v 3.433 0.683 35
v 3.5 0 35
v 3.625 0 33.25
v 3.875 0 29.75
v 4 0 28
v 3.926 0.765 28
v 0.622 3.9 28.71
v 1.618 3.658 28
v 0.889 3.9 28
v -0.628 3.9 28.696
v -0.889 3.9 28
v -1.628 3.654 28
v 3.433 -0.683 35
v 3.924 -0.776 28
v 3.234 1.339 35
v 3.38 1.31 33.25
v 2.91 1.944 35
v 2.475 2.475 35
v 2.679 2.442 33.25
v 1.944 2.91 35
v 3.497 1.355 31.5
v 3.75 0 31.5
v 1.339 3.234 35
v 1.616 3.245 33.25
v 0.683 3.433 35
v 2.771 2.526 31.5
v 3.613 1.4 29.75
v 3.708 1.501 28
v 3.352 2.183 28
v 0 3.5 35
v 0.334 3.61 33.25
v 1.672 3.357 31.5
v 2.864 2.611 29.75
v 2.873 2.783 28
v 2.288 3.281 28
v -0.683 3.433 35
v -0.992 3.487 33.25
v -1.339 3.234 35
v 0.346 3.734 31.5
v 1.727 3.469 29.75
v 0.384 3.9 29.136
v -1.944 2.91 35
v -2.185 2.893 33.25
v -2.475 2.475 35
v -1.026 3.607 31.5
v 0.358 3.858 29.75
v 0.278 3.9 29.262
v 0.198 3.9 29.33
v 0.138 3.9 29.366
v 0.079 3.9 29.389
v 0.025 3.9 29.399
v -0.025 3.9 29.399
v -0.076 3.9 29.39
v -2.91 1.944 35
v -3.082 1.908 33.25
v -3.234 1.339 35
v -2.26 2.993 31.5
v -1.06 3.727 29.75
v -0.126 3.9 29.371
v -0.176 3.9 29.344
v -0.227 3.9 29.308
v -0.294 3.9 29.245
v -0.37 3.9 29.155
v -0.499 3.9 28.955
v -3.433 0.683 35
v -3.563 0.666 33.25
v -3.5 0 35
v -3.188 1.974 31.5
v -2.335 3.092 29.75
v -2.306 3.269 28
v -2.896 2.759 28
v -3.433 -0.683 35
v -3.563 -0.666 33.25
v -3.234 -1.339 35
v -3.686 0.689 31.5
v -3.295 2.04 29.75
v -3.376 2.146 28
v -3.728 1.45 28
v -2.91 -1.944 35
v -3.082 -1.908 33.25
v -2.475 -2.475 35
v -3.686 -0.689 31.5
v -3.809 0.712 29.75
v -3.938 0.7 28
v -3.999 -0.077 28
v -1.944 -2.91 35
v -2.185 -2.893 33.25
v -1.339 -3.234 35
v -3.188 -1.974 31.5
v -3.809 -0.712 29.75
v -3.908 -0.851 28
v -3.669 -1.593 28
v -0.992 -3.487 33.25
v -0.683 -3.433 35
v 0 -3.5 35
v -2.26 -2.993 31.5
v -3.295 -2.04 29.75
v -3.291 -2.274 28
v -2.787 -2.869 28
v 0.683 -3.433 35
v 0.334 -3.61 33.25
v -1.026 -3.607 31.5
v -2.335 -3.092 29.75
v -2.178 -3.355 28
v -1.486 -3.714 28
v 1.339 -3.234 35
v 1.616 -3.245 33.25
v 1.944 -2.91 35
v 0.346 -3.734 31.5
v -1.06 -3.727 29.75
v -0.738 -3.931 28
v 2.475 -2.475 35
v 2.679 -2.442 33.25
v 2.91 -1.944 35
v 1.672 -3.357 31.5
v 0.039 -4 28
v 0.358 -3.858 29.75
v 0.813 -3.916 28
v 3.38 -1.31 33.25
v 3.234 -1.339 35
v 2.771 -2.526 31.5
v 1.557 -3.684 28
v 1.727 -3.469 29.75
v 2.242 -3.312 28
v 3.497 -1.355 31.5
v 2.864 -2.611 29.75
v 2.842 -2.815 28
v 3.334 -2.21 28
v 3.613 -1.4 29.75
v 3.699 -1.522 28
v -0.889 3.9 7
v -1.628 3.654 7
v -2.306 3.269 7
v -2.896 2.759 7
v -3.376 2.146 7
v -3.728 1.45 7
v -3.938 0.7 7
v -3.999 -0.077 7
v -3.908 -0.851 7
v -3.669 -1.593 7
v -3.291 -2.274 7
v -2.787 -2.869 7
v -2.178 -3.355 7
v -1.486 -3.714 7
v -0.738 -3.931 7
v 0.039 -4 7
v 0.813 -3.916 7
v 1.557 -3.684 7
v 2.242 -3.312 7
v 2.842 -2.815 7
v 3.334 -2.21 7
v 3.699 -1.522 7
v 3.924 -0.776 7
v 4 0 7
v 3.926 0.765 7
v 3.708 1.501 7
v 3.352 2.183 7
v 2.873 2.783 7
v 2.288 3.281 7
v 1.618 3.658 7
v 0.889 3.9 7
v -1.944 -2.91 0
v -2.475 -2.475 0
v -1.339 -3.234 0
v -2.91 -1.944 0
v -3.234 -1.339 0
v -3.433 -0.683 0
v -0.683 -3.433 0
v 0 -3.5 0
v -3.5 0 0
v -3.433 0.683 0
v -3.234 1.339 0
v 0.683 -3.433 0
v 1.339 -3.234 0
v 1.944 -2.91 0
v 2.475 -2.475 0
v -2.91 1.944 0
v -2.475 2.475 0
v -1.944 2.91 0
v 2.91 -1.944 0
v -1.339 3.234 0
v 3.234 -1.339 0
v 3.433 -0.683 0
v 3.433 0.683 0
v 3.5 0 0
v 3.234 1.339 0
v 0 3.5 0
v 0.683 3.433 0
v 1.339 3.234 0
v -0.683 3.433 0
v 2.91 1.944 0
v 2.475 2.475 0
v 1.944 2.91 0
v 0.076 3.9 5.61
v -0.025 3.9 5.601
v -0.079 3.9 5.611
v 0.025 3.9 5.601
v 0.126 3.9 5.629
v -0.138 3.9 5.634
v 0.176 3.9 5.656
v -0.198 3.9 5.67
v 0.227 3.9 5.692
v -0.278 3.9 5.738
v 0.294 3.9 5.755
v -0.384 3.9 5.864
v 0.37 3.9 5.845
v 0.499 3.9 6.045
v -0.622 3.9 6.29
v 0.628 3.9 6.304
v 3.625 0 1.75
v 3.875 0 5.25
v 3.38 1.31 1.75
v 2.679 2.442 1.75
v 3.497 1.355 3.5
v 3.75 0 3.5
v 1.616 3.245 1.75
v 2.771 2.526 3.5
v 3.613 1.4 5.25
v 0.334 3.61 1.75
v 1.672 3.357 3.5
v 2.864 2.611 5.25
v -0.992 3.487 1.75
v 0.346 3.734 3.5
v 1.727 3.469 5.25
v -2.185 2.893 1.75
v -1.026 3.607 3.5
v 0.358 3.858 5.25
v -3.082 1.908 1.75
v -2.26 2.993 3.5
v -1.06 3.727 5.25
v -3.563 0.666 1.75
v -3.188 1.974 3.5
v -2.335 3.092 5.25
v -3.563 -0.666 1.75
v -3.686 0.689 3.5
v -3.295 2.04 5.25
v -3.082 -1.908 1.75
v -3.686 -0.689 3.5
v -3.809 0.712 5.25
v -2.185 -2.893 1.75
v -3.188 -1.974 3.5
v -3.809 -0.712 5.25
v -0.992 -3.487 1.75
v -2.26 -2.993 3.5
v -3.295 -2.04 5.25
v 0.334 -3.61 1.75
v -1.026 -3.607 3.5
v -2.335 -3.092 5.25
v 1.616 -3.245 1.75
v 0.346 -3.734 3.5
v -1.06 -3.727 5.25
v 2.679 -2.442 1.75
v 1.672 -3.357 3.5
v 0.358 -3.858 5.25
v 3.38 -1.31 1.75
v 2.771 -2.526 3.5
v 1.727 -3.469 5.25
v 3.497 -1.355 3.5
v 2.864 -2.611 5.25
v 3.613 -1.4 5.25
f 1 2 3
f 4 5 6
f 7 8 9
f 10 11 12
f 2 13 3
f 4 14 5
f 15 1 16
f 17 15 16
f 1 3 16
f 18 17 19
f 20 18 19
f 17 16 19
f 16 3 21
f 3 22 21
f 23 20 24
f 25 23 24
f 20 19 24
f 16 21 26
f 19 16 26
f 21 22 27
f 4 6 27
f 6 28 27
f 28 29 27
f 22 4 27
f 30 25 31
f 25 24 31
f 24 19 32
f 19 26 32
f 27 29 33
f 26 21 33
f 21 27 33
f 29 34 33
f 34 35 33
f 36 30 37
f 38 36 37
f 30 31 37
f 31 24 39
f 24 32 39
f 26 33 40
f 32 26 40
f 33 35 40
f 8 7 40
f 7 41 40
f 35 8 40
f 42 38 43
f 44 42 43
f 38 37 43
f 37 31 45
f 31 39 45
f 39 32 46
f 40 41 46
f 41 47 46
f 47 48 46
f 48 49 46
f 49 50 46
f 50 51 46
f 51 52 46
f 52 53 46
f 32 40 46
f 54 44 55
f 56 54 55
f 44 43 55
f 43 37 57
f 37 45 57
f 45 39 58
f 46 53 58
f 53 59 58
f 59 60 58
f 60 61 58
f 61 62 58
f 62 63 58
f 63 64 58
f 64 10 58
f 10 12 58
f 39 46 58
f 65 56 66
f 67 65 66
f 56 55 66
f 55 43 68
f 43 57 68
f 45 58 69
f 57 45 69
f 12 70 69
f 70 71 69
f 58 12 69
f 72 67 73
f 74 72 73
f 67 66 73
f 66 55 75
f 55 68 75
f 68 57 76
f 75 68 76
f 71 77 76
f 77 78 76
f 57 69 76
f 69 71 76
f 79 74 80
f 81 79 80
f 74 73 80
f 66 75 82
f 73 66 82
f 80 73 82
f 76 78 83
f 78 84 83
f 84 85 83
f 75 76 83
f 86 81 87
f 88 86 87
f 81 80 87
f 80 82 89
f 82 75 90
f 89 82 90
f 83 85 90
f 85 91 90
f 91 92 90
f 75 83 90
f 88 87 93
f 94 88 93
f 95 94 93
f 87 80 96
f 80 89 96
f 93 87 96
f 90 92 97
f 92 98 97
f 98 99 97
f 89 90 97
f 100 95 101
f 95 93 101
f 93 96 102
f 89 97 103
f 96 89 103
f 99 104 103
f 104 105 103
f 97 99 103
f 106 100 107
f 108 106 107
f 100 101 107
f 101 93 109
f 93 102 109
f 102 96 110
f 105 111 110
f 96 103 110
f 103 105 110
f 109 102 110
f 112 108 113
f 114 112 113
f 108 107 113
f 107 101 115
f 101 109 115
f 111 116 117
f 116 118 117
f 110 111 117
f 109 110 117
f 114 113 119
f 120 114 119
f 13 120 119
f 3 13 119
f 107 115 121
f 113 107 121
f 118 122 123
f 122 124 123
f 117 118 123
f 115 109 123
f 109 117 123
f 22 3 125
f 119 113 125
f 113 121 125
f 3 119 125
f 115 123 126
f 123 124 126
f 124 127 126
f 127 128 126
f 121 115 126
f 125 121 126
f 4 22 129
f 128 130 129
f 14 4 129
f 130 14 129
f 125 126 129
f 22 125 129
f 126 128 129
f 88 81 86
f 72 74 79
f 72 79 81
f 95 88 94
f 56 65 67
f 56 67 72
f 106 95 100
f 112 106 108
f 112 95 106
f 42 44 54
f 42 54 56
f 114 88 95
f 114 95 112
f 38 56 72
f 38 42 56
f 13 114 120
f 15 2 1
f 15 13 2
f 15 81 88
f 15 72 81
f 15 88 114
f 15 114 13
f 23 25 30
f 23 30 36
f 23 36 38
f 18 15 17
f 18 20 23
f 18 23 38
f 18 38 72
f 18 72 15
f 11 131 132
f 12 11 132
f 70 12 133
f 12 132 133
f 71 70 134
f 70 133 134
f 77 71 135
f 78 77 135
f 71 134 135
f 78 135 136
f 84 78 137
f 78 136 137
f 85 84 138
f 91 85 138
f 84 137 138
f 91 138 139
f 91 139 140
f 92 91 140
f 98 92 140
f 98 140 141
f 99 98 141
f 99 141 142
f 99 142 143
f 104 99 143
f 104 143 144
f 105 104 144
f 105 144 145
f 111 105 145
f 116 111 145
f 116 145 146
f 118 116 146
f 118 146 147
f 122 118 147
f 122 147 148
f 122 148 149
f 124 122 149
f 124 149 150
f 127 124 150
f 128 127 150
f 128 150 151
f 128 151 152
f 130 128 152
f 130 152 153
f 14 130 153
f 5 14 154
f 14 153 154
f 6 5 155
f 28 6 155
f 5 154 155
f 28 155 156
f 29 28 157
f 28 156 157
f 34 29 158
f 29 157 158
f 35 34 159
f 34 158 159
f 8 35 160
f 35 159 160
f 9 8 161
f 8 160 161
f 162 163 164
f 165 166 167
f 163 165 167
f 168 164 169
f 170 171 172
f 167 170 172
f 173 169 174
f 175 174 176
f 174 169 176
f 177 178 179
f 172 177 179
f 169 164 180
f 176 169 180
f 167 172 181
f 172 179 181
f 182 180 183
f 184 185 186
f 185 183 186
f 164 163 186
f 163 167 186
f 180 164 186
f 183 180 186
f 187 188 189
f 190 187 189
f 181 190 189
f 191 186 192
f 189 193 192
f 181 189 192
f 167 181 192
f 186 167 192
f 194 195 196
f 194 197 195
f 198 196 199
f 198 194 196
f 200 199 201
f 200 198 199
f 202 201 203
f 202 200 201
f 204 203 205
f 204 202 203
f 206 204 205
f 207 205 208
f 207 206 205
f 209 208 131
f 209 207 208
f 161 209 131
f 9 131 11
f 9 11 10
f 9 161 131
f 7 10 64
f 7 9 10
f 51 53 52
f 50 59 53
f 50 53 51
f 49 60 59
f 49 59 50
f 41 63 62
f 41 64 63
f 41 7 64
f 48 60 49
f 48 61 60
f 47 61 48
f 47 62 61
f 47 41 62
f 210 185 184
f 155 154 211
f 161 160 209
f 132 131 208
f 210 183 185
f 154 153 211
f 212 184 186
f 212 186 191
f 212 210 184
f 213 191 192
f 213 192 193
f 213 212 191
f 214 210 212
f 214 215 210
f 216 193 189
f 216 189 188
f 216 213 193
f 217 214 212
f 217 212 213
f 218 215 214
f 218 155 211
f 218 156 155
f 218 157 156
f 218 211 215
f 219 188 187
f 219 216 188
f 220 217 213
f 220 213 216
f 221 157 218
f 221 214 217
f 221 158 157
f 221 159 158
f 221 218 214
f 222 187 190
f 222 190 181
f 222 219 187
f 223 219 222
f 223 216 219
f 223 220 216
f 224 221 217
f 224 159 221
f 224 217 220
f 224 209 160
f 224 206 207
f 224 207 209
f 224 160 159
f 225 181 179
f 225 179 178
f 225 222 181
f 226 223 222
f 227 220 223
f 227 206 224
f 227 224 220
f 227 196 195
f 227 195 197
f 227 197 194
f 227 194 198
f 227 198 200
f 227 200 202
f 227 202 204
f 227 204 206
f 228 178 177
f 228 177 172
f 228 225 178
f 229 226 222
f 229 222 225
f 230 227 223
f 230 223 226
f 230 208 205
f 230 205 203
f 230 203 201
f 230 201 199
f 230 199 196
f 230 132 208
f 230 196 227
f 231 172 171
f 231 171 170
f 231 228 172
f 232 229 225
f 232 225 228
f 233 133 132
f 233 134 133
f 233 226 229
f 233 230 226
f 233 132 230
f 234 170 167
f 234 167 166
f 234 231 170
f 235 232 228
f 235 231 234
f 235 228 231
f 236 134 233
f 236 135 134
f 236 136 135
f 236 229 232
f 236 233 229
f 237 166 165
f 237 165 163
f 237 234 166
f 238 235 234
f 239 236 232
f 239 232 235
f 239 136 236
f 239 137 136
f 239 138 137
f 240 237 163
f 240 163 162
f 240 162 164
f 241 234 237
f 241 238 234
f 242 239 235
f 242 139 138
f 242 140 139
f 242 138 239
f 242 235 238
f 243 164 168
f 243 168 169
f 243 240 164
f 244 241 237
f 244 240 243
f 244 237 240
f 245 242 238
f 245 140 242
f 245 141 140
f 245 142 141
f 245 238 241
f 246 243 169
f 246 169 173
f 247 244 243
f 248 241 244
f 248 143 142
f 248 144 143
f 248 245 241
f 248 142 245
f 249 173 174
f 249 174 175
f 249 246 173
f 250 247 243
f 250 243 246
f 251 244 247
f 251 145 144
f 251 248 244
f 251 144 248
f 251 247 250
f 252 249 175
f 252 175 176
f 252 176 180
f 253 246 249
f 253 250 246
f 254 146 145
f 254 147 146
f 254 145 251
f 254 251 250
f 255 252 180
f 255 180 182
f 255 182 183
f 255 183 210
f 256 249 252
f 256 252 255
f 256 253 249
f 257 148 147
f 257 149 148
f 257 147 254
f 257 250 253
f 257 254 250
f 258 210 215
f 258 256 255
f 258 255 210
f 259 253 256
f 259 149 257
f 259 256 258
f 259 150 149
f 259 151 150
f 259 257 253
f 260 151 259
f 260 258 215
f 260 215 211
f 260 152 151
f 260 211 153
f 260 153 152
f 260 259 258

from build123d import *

# Parameters (mm, degrees)
F0_R       = 4
F1_DEPTH   = 35
F2_SIZE2   = 7
F2_SIZE    = 0.5
F2_2_SIZE2 = 7
F2_2_SIZE  = 0.5
F3_W       = 10
F3_H       = 35
F4_DEPTH   = 12.5


with BuildPart() as f1:
    # F0 (on Top) → F1 (new body)
    with BuildSketch(Plane.XY):
        Circle(F0_R)
    extrude(amount=F1_DEPTH)

    # F2
    f2_edges = [f1.edges().sort_by_distance(p)[0] for p in [
        (-4, 0, 35),
    ]]
    f2_side = f1.faces().sort_by_distance((0, 0, 35))[0]
    chamfer(f2_edges, length=F2_SIZE, length2=F2_SIZE2, reference=f2_side)

    # F2#2
    f2_2_edges = [f1.edges().sort_by_distance(p)[0] for p in [
        (-4, 0, 0),
    ]]
    f2_2_side = f1.faces().sort_by_distance((0, 0, 0))[0]
    chamfer(f2_2_edges, length=F2_2_SIZE, length2=F2_2_SIZE2, reference=f2_2_side)

    # F3 (on Right) → F4 (cut, symmetric)
    with BuildSketch(Plane.YZ):
        with Locations((8.9, 17.5)):
            Rectangle(F3_W, F3_H)
    extrude(amount=F4_DEPTH, both=True, mode=Mode.SUBTRACT)


solid = f1.part
